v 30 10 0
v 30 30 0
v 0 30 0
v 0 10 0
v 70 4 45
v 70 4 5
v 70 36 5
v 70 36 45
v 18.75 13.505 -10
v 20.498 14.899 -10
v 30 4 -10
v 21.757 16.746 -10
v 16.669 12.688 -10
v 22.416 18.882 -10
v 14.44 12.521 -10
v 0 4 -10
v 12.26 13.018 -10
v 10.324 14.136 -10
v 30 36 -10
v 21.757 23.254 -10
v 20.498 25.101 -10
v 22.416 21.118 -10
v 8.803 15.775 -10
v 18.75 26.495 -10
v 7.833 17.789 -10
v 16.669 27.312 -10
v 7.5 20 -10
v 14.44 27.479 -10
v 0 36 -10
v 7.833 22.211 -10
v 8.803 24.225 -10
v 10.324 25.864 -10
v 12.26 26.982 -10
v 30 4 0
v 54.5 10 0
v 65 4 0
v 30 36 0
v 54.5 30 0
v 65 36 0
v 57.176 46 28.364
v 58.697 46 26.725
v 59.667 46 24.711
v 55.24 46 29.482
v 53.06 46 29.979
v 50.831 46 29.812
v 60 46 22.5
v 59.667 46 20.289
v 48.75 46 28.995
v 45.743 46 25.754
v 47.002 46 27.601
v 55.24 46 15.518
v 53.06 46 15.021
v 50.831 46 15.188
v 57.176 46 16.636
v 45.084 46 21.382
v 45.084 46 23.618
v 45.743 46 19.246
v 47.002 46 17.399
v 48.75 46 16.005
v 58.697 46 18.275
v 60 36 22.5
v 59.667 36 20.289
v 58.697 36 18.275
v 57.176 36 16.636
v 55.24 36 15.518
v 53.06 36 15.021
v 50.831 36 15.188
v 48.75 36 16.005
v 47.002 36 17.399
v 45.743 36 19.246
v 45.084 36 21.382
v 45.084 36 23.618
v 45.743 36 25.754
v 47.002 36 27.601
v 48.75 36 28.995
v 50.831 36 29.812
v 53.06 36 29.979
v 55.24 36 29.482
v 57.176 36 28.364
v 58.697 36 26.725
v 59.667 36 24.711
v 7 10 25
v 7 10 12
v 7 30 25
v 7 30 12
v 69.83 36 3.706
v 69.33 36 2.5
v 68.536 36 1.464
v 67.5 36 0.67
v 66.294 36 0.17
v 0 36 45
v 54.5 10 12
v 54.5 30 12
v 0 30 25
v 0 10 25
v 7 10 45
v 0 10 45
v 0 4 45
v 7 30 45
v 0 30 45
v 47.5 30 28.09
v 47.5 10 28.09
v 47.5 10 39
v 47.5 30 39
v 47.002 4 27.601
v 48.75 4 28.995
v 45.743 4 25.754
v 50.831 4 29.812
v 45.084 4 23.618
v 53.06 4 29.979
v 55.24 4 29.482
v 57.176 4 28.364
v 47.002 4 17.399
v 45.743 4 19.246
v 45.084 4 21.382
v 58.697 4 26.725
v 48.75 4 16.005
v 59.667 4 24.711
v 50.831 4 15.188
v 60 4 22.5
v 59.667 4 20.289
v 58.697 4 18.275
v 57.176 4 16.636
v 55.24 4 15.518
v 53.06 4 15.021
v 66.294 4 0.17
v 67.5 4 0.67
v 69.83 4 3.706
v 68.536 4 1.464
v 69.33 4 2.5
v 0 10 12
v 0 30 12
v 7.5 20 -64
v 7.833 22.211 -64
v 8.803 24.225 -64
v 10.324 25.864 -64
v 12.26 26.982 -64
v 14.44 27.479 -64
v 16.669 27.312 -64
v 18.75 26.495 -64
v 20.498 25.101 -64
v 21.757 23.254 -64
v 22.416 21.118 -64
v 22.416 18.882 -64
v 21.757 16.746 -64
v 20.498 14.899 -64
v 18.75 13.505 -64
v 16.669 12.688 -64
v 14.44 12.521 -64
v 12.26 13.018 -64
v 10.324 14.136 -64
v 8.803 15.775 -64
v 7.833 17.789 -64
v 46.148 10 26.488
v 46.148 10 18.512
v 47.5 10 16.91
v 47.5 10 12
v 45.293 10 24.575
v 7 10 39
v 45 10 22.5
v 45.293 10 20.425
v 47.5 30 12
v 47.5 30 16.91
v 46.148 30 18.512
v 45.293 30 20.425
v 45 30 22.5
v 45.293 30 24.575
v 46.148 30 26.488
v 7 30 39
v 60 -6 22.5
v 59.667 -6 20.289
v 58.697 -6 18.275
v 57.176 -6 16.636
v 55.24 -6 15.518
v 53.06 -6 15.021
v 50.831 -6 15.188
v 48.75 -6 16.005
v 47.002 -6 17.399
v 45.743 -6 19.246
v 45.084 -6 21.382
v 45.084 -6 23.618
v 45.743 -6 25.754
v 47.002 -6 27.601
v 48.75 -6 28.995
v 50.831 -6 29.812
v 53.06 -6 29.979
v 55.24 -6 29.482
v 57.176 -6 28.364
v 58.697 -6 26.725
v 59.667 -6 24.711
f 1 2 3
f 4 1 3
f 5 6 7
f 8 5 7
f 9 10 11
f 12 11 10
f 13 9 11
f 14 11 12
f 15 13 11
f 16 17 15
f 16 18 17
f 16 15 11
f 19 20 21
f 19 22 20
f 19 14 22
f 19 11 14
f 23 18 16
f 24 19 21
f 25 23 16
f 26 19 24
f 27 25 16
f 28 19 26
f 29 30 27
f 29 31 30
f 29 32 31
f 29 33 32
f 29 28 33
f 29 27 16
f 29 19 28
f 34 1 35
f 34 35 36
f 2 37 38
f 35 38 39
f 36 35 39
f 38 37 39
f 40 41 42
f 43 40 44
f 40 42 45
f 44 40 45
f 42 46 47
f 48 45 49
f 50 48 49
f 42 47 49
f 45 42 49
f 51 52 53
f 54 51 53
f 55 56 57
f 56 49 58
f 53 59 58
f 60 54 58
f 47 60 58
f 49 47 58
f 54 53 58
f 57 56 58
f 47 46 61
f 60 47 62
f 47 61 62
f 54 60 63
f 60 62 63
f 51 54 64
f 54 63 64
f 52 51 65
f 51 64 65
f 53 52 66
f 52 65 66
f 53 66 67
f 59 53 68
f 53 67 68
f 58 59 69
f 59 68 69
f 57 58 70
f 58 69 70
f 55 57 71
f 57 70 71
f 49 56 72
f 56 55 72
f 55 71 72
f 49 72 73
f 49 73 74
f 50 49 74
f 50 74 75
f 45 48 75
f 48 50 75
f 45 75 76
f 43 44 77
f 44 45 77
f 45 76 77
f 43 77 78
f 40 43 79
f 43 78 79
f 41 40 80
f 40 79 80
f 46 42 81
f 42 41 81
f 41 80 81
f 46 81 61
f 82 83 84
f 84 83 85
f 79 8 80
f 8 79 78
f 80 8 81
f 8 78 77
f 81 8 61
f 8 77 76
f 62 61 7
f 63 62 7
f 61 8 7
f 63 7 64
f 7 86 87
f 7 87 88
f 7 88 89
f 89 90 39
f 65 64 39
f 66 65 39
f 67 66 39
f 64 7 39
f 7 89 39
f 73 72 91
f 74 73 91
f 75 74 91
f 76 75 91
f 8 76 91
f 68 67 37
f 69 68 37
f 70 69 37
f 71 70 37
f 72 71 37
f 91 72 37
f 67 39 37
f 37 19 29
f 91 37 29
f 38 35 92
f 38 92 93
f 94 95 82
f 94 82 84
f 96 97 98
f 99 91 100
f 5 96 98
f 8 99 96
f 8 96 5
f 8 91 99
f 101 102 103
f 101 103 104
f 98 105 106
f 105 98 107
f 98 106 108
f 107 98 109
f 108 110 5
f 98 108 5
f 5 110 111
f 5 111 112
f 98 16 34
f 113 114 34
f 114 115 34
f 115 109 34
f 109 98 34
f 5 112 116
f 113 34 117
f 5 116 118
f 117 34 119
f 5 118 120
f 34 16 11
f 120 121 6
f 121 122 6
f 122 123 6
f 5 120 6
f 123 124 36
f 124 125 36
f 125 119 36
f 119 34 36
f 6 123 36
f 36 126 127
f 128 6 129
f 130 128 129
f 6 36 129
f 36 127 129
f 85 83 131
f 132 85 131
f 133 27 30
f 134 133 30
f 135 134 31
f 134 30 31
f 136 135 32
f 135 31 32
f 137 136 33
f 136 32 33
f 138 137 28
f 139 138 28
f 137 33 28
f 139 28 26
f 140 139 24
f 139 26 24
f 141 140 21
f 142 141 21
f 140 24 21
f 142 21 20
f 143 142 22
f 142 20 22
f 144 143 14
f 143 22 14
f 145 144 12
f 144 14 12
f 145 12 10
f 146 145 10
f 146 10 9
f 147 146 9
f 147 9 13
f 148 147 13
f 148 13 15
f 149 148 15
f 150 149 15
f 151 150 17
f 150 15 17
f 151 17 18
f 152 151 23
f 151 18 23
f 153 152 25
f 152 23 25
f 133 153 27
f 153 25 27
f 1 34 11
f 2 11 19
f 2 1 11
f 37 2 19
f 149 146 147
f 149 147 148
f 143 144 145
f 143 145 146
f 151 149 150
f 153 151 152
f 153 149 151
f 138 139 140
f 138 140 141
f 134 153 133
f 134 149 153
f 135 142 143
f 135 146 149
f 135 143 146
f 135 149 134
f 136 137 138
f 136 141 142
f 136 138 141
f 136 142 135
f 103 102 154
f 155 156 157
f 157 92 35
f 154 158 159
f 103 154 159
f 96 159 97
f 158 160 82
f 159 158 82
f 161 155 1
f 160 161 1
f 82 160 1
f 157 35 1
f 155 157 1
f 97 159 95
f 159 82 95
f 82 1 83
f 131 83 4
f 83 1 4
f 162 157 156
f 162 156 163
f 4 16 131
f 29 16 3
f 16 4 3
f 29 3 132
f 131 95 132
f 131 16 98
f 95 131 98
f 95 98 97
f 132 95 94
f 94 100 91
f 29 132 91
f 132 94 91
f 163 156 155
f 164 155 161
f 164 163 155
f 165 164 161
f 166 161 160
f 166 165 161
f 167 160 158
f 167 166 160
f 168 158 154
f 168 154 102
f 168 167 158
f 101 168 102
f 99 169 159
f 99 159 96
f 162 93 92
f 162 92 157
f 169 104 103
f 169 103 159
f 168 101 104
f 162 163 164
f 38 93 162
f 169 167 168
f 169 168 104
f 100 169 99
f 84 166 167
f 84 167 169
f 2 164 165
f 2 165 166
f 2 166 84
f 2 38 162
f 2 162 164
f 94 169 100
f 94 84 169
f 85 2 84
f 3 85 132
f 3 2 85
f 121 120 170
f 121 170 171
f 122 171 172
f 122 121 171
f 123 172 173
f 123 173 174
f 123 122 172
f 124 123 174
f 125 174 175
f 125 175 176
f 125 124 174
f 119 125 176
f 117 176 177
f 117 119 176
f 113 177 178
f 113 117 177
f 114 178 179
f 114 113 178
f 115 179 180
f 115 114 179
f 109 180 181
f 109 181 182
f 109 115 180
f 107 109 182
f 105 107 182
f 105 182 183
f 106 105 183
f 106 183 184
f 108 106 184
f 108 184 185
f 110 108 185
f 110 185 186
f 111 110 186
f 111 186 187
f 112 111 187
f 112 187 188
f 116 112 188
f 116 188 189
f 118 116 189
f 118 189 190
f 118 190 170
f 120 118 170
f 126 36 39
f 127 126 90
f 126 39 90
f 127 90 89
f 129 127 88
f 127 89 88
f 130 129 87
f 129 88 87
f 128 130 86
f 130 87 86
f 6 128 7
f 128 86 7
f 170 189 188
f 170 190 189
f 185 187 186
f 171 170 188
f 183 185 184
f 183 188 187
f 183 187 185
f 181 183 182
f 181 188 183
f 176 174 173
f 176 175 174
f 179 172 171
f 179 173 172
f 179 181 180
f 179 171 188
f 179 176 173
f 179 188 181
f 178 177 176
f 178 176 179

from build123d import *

# Parameters (mm, degrees)
CROQUIS2_W              = 70
CROQUIS2_H              = 40
SALIENTE_EXTRUIR1_DEPTH = 45
CROQUIS3_W              = 40.5
CROQUIS3_H              = 20
CORTAR_EXTRUIR1_DEPTH   = 39
CROQUIS4_W              = 7
CROQUIS4_H              = 20
CORTAR_EXTRUIR2_DEPTH   = 12
CROQUIS5_W              = 20
CROQUIS5_H              = 20
CORTAR_EXTRUIR4_DEPTH   = 7
CROQUIS6_R              = 7.5
SALIENTE_EXTRUIR3_DEPTH = 30
CROQUIS8_R              = 7.5
SALIENTE_EXTRUIR4_DEPTH = 30
CROQUIS9_W              = 30
CROQUIS9_H              = 40
SALIENTE_EXTRUIR5_DEPTH = 10
CROQUIS10_R             = 7.5
SALIENTE_EXTRUIR6_DEPTH = 54
REDONDEO1_R             = 5
CROQUIS11_W             = 42.231434226
CROQUIS11_H             = 4
CROQUIS11_W_2           = 30
CORTAR_EXTRUIR7_DEPTH   = 60
CROQUIS12_R             = 7.5
SALIENTE_EXTRUIR7_DEPTH = 100
CROQUIS13_W             = 75.549853641
CROQUIS13_H             = 40.129267471
CORTAR_EXTRUIR8_DEPTH   = 100


with BuildPart() as part:
    # Croquis2 → Saliente-Extruir1 (new body)
    with BuildSketch(Plane.XY):
        with Locations((35, 20)):
            Rectangle(CROQUIS2_W, CROQUIS2_H)
    extrude(amount=SALIENTE_EXTRUIR1_DEPTH)

    # Croquis3 → Cortar-Extruir1 (cut)
    with BuildSketch(Plane(origin=(0, 0, 0), x_dir=(-1, 0, 0), z_dir=(0, 0, -1))):
        with Locations((-27.25, 20)):
            Rectangle(CROQUIS3_W, CROQUIS3_H)
    extrude(amount=-CORTAR_EXTRUIR1_DEPTH, mode=Mode.SUBTRACT)

    # Croquis4 → Cortar-Extruir2 (cut)
    with BuildSketch(Plane(origin=(0, 0, 0), x_dir=(-1, 0, 0), z_dir=(0, 0, -1))):
        with Locations((-3.5, 20)):
            Rectangle(CROQUIS4_W, CROQUIS4_H)
        with Locations((-51, 20)):
            Rectangle(CROQUIS4_W, CROQUIS4_H)
    extrude(amount=-CORTAR_EXTRUIR2_DEPTH, mode=Mode.SUBTRACT)

    # Croquis5 → Cortar-Extruir4 (cut)
    with BuildSketch(Plane.ZY):
        with Locations((35, 20)):
            Rectangle(CROQUIS5_W, CROQUIS5_H)
    extrude(amount=-CORTAR_EXTRUIR4_DEPTH, mode=Mode.SUBTRACT)

    # Croquis6 → Saliente-Extruir3 (add)
    with BuildSketch(Plane(origin=(0, 40, 0), x_dir=(1, 0, 0), z_dir=(0, 1, 0))):
        with Locations((52.5, -22.5)):
            Circle(CROQUIS6_R)
    extrude(amount=SALIENTE_EXTRUIR3_DEPTH)

    # Croquis8 → Saliente-Extruir4 (add)
    with BuildSketch(Plane.XZ):
        with Locations((52.5, 22.5)):
            Circle(CROQUIS8_R)
    extrude(amount=SALIENTE_EXTRUIR4_DEPTH)

    # Croquis9 → Saliente-Extruir5 (add)
    with BuildSketch(Plane(origin=(0, 0, 0), x_dir=(-1, 0, 0), z_dir=(0, 0, -1))):
        with Locations((-15, 20)):
            Rectangle(CROQUIS9_W, CROQUIS9_H)
    extrude(amount=SALIENTE_EXTRUIR5_DEPTH)

    # Croquis10 → Saliente-Extruir6 (add)
    with BuildSketch(Plane(origin=(0, 0, -10), x_dir=(-1, 0, 0), z_dir=(0, 0, -1))):
        with Locations((-15, 20)):
            Circle(CROQUIS10_R)
    extrude(amount=SALIENTE_EXTRUIR6_DEPTH)

    # Redondeo1
    redondeo1_edges = [part.edges().sort_by_distance(p)[0] for p in [
        (70, 20, 0),
    ]]
    fillet(redondeo1_edges, radius=REDONDEO1_R)

    # Croquis11 → Cortar-Extruir7 (cut)
    with BuildSketch(Plane(origin=(0, 0, -10), x_dir=(-1, 0, 0), z_dir=(0, 0, -1))):
        with Locations((-51.115717113, 2)):
            Rectangle(CROQUIS11_W, CROQUIS11_H)
        with Locations((-51.115717113, 38)):
            Rectangle(CROQUIS11_W, CROQUIS11_H)
        with Locations((-15, 38)):
            Rectangle(CROQUIS11_W_2, CROQUIS11_H)
        with Locations((-15, 2)):
            Rectangle(CROQUIS11_W_2, CROQUIS11_H)
    extrude(amount=-CORTAR_EXTRUIR7_DEPTH, mode=Mode.SUBTRACT)

    # Croquis12 → Saliente-Extruir7 (add)
    with BuildSketch(Plane(origin=(0, 70, 0), x_dir=(1, 0, 0), z_dir=(0, 1, 0))):
        with Locations((52.5, -22.5)):
            Circle(CROQUIS12_R)
    extrude(amount=-SALIENTE_EXTRUIR7_DEPTH)

    # Croquis13 → Cortar-Extruir8 (cut)
    with BuildSketch(Plane(origin=(0, 0, -10), x_dir=(-1, 0, 0), z_dir=(0, 0, -1))):
        with Locations((-37.77492682, -26.064633736)):
            Rectangle(CROQUIS13_W, CROQUIS13_H)
        with Locations((-37.77492682, 66.064633735)):
            Rectangle(CROQUIS13_W, CROQUIS13_H)
    extrude(amount=-CORTAR_EXTRUIR8_DEPTH, mode=Mode.SUBTRACT)


solid = part.part
